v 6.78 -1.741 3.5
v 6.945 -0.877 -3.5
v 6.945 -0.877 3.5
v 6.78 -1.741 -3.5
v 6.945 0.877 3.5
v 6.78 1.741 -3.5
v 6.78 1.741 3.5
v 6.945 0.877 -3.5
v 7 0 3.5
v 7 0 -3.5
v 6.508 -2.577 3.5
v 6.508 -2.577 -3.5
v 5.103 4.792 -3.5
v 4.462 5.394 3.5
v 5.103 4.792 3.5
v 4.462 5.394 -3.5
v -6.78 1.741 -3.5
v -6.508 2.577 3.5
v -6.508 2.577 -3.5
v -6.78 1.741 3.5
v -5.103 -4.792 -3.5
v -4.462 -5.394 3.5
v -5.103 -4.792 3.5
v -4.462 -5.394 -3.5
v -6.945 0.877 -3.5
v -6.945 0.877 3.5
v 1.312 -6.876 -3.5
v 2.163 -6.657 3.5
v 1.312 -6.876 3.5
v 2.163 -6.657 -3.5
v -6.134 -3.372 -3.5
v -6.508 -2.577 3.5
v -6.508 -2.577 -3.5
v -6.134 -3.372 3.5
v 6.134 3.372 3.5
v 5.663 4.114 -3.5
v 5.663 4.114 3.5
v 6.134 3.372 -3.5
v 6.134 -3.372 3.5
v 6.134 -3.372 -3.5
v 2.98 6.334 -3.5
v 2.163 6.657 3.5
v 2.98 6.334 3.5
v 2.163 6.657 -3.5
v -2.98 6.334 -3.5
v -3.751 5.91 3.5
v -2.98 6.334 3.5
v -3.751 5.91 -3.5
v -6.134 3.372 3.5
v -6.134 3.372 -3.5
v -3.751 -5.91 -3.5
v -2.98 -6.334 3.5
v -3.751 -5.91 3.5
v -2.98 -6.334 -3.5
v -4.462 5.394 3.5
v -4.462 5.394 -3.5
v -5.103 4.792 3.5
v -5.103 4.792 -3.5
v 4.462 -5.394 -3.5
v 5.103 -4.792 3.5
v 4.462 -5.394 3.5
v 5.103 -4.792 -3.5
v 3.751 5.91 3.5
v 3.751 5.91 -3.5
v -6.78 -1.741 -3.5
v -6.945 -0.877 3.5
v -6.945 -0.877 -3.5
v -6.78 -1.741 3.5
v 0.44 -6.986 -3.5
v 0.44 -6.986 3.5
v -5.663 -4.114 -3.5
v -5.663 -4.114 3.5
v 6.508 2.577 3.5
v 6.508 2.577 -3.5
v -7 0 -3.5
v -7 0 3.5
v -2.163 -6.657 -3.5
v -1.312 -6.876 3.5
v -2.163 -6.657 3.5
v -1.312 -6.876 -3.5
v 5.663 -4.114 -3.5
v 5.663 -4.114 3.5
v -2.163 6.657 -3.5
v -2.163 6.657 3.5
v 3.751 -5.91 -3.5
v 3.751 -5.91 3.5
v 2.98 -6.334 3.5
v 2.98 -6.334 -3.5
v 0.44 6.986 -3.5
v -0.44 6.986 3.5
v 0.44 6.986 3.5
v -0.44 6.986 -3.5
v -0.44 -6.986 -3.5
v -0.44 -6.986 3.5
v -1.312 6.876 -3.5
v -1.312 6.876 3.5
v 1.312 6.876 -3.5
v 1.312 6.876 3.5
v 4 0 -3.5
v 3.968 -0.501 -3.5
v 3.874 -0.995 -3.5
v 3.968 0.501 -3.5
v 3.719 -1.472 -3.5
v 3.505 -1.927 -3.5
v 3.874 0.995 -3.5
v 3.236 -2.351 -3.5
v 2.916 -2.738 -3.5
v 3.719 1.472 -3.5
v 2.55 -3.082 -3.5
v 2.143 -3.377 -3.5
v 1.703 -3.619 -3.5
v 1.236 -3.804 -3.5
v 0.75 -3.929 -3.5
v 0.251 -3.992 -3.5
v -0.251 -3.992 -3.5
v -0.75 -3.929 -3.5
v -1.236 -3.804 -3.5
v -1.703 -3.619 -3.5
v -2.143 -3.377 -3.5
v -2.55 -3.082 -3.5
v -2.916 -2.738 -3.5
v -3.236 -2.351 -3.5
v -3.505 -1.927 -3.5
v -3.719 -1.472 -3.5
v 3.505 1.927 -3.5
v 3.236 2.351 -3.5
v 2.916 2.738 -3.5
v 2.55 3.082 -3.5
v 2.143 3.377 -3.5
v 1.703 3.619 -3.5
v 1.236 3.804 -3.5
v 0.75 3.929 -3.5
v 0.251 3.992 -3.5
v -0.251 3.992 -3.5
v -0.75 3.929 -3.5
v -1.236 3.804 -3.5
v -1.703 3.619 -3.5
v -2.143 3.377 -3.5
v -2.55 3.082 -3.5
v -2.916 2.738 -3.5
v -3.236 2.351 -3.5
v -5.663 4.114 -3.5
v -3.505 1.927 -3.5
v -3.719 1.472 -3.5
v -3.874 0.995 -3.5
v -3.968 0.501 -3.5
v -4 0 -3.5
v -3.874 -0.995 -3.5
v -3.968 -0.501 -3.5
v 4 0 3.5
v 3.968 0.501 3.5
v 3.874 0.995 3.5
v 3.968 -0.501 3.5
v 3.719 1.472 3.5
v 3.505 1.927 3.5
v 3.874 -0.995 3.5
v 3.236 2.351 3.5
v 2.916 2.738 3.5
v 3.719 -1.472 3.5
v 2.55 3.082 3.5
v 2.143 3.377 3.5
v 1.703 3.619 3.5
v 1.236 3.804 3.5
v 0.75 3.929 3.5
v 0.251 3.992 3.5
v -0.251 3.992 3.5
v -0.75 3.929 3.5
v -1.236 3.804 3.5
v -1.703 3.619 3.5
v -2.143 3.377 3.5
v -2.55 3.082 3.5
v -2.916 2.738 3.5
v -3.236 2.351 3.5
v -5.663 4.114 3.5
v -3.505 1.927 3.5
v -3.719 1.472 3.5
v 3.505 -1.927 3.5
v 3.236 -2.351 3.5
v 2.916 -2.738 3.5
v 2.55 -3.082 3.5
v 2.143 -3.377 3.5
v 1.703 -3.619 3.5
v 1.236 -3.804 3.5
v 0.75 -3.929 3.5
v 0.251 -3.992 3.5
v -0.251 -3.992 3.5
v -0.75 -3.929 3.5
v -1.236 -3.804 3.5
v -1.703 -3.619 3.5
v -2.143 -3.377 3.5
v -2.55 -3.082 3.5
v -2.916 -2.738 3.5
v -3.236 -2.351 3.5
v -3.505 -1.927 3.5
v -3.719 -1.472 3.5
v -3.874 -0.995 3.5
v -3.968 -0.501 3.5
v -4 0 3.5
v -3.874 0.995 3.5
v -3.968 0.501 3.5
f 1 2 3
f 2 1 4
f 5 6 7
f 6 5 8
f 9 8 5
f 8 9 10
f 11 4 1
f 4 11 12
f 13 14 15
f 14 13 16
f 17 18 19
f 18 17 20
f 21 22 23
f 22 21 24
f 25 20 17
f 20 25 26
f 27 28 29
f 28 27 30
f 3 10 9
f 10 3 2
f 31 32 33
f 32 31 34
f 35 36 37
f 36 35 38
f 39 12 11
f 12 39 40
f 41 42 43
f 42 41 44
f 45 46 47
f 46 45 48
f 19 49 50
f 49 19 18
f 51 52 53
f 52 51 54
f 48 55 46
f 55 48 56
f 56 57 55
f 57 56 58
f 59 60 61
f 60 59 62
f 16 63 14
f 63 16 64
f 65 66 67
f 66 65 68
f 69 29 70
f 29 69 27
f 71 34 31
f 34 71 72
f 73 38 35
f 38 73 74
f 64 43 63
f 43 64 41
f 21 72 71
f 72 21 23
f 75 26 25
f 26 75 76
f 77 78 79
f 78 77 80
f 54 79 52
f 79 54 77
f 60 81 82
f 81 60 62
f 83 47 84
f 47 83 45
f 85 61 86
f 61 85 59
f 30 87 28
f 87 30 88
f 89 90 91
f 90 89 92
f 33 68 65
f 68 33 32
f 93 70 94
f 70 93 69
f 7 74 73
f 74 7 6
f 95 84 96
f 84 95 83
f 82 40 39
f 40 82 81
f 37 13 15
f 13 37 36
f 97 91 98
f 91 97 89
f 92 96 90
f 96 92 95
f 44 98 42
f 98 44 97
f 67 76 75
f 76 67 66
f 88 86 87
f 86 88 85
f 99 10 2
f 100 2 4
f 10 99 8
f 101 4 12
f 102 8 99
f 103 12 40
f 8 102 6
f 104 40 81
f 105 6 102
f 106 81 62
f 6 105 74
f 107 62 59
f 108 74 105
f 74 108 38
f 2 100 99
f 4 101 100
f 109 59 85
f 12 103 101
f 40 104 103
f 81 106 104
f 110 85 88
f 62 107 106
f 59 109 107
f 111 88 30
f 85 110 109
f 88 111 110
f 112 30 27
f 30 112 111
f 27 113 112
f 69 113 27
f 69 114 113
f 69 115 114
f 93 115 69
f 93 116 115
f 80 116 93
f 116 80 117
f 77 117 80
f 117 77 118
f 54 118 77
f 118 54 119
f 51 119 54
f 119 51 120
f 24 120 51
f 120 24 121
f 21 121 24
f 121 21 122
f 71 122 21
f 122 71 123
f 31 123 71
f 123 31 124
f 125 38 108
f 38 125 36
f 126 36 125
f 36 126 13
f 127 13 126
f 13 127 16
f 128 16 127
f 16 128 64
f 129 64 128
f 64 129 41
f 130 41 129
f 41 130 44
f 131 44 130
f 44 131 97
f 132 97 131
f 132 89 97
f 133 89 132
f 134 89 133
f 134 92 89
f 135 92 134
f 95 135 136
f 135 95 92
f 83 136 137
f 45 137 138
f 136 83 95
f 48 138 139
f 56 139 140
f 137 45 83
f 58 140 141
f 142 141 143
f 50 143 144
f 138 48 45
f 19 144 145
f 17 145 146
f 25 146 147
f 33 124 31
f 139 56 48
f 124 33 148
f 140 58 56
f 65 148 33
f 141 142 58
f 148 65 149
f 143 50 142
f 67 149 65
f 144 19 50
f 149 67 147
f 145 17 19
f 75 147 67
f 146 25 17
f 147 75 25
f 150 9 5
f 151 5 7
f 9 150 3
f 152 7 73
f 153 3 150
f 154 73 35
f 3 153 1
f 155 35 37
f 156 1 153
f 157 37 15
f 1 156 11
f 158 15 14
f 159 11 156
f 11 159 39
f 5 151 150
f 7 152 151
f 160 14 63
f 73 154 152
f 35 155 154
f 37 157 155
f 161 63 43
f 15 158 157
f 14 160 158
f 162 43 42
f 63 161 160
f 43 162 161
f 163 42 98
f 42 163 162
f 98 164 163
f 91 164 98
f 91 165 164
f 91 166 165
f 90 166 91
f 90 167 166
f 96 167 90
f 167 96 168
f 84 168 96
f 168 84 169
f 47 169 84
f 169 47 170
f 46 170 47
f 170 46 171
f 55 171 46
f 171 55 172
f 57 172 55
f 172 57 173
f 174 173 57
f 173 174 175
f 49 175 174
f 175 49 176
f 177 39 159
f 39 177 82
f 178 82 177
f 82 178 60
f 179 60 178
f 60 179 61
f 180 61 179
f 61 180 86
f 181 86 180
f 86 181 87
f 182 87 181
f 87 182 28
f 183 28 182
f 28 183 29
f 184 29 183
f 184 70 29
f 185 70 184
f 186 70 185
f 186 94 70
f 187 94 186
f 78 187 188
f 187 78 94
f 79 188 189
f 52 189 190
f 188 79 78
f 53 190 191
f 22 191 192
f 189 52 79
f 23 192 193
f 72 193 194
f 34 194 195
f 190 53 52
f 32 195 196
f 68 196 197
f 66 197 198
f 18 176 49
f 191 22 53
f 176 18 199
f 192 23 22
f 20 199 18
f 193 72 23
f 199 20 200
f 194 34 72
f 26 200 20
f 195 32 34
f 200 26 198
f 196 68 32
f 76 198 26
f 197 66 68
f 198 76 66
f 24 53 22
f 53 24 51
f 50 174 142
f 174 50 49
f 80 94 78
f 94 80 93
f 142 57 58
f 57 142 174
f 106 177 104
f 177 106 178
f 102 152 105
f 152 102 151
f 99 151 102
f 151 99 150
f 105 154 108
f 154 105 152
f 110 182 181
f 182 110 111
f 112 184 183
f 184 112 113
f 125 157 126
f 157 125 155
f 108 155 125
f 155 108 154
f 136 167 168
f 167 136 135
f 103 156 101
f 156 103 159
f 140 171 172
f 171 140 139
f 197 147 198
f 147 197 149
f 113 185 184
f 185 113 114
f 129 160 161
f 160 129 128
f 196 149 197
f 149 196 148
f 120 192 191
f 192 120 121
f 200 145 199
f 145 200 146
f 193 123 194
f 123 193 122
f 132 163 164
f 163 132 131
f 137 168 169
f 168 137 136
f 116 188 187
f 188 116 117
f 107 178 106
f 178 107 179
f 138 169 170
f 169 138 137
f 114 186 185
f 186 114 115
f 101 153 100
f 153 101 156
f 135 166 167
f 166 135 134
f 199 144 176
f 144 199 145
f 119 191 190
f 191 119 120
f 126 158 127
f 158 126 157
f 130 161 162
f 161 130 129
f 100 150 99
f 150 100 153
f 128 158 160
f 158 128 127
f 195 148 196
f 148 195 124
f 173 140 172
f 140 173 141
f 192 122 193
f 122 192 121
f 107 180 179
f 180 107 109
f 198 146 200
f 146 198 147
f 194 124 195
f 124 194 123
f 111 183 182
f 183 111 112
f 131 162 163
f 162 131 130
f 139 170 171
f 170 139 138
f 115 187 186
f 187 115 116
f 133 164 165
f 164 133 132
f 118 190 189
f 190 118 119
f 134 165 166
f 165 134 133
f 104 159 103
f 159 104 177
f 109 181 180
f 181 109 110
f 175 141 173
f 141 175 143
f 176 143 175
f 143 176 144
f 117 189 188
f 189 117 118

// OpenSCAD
$fn = 50;


difference() {
	union() {
		translate(v = [0, 0, -3.5000000000]) {
			cylinder(h = 7, r = 7.0000000000);
		}
	}
	union() {
		translate(v = [0, 0, -100.0000000000]) {
			cylinder(h = 200, r = 4.0000000000);
		}
	}
}
